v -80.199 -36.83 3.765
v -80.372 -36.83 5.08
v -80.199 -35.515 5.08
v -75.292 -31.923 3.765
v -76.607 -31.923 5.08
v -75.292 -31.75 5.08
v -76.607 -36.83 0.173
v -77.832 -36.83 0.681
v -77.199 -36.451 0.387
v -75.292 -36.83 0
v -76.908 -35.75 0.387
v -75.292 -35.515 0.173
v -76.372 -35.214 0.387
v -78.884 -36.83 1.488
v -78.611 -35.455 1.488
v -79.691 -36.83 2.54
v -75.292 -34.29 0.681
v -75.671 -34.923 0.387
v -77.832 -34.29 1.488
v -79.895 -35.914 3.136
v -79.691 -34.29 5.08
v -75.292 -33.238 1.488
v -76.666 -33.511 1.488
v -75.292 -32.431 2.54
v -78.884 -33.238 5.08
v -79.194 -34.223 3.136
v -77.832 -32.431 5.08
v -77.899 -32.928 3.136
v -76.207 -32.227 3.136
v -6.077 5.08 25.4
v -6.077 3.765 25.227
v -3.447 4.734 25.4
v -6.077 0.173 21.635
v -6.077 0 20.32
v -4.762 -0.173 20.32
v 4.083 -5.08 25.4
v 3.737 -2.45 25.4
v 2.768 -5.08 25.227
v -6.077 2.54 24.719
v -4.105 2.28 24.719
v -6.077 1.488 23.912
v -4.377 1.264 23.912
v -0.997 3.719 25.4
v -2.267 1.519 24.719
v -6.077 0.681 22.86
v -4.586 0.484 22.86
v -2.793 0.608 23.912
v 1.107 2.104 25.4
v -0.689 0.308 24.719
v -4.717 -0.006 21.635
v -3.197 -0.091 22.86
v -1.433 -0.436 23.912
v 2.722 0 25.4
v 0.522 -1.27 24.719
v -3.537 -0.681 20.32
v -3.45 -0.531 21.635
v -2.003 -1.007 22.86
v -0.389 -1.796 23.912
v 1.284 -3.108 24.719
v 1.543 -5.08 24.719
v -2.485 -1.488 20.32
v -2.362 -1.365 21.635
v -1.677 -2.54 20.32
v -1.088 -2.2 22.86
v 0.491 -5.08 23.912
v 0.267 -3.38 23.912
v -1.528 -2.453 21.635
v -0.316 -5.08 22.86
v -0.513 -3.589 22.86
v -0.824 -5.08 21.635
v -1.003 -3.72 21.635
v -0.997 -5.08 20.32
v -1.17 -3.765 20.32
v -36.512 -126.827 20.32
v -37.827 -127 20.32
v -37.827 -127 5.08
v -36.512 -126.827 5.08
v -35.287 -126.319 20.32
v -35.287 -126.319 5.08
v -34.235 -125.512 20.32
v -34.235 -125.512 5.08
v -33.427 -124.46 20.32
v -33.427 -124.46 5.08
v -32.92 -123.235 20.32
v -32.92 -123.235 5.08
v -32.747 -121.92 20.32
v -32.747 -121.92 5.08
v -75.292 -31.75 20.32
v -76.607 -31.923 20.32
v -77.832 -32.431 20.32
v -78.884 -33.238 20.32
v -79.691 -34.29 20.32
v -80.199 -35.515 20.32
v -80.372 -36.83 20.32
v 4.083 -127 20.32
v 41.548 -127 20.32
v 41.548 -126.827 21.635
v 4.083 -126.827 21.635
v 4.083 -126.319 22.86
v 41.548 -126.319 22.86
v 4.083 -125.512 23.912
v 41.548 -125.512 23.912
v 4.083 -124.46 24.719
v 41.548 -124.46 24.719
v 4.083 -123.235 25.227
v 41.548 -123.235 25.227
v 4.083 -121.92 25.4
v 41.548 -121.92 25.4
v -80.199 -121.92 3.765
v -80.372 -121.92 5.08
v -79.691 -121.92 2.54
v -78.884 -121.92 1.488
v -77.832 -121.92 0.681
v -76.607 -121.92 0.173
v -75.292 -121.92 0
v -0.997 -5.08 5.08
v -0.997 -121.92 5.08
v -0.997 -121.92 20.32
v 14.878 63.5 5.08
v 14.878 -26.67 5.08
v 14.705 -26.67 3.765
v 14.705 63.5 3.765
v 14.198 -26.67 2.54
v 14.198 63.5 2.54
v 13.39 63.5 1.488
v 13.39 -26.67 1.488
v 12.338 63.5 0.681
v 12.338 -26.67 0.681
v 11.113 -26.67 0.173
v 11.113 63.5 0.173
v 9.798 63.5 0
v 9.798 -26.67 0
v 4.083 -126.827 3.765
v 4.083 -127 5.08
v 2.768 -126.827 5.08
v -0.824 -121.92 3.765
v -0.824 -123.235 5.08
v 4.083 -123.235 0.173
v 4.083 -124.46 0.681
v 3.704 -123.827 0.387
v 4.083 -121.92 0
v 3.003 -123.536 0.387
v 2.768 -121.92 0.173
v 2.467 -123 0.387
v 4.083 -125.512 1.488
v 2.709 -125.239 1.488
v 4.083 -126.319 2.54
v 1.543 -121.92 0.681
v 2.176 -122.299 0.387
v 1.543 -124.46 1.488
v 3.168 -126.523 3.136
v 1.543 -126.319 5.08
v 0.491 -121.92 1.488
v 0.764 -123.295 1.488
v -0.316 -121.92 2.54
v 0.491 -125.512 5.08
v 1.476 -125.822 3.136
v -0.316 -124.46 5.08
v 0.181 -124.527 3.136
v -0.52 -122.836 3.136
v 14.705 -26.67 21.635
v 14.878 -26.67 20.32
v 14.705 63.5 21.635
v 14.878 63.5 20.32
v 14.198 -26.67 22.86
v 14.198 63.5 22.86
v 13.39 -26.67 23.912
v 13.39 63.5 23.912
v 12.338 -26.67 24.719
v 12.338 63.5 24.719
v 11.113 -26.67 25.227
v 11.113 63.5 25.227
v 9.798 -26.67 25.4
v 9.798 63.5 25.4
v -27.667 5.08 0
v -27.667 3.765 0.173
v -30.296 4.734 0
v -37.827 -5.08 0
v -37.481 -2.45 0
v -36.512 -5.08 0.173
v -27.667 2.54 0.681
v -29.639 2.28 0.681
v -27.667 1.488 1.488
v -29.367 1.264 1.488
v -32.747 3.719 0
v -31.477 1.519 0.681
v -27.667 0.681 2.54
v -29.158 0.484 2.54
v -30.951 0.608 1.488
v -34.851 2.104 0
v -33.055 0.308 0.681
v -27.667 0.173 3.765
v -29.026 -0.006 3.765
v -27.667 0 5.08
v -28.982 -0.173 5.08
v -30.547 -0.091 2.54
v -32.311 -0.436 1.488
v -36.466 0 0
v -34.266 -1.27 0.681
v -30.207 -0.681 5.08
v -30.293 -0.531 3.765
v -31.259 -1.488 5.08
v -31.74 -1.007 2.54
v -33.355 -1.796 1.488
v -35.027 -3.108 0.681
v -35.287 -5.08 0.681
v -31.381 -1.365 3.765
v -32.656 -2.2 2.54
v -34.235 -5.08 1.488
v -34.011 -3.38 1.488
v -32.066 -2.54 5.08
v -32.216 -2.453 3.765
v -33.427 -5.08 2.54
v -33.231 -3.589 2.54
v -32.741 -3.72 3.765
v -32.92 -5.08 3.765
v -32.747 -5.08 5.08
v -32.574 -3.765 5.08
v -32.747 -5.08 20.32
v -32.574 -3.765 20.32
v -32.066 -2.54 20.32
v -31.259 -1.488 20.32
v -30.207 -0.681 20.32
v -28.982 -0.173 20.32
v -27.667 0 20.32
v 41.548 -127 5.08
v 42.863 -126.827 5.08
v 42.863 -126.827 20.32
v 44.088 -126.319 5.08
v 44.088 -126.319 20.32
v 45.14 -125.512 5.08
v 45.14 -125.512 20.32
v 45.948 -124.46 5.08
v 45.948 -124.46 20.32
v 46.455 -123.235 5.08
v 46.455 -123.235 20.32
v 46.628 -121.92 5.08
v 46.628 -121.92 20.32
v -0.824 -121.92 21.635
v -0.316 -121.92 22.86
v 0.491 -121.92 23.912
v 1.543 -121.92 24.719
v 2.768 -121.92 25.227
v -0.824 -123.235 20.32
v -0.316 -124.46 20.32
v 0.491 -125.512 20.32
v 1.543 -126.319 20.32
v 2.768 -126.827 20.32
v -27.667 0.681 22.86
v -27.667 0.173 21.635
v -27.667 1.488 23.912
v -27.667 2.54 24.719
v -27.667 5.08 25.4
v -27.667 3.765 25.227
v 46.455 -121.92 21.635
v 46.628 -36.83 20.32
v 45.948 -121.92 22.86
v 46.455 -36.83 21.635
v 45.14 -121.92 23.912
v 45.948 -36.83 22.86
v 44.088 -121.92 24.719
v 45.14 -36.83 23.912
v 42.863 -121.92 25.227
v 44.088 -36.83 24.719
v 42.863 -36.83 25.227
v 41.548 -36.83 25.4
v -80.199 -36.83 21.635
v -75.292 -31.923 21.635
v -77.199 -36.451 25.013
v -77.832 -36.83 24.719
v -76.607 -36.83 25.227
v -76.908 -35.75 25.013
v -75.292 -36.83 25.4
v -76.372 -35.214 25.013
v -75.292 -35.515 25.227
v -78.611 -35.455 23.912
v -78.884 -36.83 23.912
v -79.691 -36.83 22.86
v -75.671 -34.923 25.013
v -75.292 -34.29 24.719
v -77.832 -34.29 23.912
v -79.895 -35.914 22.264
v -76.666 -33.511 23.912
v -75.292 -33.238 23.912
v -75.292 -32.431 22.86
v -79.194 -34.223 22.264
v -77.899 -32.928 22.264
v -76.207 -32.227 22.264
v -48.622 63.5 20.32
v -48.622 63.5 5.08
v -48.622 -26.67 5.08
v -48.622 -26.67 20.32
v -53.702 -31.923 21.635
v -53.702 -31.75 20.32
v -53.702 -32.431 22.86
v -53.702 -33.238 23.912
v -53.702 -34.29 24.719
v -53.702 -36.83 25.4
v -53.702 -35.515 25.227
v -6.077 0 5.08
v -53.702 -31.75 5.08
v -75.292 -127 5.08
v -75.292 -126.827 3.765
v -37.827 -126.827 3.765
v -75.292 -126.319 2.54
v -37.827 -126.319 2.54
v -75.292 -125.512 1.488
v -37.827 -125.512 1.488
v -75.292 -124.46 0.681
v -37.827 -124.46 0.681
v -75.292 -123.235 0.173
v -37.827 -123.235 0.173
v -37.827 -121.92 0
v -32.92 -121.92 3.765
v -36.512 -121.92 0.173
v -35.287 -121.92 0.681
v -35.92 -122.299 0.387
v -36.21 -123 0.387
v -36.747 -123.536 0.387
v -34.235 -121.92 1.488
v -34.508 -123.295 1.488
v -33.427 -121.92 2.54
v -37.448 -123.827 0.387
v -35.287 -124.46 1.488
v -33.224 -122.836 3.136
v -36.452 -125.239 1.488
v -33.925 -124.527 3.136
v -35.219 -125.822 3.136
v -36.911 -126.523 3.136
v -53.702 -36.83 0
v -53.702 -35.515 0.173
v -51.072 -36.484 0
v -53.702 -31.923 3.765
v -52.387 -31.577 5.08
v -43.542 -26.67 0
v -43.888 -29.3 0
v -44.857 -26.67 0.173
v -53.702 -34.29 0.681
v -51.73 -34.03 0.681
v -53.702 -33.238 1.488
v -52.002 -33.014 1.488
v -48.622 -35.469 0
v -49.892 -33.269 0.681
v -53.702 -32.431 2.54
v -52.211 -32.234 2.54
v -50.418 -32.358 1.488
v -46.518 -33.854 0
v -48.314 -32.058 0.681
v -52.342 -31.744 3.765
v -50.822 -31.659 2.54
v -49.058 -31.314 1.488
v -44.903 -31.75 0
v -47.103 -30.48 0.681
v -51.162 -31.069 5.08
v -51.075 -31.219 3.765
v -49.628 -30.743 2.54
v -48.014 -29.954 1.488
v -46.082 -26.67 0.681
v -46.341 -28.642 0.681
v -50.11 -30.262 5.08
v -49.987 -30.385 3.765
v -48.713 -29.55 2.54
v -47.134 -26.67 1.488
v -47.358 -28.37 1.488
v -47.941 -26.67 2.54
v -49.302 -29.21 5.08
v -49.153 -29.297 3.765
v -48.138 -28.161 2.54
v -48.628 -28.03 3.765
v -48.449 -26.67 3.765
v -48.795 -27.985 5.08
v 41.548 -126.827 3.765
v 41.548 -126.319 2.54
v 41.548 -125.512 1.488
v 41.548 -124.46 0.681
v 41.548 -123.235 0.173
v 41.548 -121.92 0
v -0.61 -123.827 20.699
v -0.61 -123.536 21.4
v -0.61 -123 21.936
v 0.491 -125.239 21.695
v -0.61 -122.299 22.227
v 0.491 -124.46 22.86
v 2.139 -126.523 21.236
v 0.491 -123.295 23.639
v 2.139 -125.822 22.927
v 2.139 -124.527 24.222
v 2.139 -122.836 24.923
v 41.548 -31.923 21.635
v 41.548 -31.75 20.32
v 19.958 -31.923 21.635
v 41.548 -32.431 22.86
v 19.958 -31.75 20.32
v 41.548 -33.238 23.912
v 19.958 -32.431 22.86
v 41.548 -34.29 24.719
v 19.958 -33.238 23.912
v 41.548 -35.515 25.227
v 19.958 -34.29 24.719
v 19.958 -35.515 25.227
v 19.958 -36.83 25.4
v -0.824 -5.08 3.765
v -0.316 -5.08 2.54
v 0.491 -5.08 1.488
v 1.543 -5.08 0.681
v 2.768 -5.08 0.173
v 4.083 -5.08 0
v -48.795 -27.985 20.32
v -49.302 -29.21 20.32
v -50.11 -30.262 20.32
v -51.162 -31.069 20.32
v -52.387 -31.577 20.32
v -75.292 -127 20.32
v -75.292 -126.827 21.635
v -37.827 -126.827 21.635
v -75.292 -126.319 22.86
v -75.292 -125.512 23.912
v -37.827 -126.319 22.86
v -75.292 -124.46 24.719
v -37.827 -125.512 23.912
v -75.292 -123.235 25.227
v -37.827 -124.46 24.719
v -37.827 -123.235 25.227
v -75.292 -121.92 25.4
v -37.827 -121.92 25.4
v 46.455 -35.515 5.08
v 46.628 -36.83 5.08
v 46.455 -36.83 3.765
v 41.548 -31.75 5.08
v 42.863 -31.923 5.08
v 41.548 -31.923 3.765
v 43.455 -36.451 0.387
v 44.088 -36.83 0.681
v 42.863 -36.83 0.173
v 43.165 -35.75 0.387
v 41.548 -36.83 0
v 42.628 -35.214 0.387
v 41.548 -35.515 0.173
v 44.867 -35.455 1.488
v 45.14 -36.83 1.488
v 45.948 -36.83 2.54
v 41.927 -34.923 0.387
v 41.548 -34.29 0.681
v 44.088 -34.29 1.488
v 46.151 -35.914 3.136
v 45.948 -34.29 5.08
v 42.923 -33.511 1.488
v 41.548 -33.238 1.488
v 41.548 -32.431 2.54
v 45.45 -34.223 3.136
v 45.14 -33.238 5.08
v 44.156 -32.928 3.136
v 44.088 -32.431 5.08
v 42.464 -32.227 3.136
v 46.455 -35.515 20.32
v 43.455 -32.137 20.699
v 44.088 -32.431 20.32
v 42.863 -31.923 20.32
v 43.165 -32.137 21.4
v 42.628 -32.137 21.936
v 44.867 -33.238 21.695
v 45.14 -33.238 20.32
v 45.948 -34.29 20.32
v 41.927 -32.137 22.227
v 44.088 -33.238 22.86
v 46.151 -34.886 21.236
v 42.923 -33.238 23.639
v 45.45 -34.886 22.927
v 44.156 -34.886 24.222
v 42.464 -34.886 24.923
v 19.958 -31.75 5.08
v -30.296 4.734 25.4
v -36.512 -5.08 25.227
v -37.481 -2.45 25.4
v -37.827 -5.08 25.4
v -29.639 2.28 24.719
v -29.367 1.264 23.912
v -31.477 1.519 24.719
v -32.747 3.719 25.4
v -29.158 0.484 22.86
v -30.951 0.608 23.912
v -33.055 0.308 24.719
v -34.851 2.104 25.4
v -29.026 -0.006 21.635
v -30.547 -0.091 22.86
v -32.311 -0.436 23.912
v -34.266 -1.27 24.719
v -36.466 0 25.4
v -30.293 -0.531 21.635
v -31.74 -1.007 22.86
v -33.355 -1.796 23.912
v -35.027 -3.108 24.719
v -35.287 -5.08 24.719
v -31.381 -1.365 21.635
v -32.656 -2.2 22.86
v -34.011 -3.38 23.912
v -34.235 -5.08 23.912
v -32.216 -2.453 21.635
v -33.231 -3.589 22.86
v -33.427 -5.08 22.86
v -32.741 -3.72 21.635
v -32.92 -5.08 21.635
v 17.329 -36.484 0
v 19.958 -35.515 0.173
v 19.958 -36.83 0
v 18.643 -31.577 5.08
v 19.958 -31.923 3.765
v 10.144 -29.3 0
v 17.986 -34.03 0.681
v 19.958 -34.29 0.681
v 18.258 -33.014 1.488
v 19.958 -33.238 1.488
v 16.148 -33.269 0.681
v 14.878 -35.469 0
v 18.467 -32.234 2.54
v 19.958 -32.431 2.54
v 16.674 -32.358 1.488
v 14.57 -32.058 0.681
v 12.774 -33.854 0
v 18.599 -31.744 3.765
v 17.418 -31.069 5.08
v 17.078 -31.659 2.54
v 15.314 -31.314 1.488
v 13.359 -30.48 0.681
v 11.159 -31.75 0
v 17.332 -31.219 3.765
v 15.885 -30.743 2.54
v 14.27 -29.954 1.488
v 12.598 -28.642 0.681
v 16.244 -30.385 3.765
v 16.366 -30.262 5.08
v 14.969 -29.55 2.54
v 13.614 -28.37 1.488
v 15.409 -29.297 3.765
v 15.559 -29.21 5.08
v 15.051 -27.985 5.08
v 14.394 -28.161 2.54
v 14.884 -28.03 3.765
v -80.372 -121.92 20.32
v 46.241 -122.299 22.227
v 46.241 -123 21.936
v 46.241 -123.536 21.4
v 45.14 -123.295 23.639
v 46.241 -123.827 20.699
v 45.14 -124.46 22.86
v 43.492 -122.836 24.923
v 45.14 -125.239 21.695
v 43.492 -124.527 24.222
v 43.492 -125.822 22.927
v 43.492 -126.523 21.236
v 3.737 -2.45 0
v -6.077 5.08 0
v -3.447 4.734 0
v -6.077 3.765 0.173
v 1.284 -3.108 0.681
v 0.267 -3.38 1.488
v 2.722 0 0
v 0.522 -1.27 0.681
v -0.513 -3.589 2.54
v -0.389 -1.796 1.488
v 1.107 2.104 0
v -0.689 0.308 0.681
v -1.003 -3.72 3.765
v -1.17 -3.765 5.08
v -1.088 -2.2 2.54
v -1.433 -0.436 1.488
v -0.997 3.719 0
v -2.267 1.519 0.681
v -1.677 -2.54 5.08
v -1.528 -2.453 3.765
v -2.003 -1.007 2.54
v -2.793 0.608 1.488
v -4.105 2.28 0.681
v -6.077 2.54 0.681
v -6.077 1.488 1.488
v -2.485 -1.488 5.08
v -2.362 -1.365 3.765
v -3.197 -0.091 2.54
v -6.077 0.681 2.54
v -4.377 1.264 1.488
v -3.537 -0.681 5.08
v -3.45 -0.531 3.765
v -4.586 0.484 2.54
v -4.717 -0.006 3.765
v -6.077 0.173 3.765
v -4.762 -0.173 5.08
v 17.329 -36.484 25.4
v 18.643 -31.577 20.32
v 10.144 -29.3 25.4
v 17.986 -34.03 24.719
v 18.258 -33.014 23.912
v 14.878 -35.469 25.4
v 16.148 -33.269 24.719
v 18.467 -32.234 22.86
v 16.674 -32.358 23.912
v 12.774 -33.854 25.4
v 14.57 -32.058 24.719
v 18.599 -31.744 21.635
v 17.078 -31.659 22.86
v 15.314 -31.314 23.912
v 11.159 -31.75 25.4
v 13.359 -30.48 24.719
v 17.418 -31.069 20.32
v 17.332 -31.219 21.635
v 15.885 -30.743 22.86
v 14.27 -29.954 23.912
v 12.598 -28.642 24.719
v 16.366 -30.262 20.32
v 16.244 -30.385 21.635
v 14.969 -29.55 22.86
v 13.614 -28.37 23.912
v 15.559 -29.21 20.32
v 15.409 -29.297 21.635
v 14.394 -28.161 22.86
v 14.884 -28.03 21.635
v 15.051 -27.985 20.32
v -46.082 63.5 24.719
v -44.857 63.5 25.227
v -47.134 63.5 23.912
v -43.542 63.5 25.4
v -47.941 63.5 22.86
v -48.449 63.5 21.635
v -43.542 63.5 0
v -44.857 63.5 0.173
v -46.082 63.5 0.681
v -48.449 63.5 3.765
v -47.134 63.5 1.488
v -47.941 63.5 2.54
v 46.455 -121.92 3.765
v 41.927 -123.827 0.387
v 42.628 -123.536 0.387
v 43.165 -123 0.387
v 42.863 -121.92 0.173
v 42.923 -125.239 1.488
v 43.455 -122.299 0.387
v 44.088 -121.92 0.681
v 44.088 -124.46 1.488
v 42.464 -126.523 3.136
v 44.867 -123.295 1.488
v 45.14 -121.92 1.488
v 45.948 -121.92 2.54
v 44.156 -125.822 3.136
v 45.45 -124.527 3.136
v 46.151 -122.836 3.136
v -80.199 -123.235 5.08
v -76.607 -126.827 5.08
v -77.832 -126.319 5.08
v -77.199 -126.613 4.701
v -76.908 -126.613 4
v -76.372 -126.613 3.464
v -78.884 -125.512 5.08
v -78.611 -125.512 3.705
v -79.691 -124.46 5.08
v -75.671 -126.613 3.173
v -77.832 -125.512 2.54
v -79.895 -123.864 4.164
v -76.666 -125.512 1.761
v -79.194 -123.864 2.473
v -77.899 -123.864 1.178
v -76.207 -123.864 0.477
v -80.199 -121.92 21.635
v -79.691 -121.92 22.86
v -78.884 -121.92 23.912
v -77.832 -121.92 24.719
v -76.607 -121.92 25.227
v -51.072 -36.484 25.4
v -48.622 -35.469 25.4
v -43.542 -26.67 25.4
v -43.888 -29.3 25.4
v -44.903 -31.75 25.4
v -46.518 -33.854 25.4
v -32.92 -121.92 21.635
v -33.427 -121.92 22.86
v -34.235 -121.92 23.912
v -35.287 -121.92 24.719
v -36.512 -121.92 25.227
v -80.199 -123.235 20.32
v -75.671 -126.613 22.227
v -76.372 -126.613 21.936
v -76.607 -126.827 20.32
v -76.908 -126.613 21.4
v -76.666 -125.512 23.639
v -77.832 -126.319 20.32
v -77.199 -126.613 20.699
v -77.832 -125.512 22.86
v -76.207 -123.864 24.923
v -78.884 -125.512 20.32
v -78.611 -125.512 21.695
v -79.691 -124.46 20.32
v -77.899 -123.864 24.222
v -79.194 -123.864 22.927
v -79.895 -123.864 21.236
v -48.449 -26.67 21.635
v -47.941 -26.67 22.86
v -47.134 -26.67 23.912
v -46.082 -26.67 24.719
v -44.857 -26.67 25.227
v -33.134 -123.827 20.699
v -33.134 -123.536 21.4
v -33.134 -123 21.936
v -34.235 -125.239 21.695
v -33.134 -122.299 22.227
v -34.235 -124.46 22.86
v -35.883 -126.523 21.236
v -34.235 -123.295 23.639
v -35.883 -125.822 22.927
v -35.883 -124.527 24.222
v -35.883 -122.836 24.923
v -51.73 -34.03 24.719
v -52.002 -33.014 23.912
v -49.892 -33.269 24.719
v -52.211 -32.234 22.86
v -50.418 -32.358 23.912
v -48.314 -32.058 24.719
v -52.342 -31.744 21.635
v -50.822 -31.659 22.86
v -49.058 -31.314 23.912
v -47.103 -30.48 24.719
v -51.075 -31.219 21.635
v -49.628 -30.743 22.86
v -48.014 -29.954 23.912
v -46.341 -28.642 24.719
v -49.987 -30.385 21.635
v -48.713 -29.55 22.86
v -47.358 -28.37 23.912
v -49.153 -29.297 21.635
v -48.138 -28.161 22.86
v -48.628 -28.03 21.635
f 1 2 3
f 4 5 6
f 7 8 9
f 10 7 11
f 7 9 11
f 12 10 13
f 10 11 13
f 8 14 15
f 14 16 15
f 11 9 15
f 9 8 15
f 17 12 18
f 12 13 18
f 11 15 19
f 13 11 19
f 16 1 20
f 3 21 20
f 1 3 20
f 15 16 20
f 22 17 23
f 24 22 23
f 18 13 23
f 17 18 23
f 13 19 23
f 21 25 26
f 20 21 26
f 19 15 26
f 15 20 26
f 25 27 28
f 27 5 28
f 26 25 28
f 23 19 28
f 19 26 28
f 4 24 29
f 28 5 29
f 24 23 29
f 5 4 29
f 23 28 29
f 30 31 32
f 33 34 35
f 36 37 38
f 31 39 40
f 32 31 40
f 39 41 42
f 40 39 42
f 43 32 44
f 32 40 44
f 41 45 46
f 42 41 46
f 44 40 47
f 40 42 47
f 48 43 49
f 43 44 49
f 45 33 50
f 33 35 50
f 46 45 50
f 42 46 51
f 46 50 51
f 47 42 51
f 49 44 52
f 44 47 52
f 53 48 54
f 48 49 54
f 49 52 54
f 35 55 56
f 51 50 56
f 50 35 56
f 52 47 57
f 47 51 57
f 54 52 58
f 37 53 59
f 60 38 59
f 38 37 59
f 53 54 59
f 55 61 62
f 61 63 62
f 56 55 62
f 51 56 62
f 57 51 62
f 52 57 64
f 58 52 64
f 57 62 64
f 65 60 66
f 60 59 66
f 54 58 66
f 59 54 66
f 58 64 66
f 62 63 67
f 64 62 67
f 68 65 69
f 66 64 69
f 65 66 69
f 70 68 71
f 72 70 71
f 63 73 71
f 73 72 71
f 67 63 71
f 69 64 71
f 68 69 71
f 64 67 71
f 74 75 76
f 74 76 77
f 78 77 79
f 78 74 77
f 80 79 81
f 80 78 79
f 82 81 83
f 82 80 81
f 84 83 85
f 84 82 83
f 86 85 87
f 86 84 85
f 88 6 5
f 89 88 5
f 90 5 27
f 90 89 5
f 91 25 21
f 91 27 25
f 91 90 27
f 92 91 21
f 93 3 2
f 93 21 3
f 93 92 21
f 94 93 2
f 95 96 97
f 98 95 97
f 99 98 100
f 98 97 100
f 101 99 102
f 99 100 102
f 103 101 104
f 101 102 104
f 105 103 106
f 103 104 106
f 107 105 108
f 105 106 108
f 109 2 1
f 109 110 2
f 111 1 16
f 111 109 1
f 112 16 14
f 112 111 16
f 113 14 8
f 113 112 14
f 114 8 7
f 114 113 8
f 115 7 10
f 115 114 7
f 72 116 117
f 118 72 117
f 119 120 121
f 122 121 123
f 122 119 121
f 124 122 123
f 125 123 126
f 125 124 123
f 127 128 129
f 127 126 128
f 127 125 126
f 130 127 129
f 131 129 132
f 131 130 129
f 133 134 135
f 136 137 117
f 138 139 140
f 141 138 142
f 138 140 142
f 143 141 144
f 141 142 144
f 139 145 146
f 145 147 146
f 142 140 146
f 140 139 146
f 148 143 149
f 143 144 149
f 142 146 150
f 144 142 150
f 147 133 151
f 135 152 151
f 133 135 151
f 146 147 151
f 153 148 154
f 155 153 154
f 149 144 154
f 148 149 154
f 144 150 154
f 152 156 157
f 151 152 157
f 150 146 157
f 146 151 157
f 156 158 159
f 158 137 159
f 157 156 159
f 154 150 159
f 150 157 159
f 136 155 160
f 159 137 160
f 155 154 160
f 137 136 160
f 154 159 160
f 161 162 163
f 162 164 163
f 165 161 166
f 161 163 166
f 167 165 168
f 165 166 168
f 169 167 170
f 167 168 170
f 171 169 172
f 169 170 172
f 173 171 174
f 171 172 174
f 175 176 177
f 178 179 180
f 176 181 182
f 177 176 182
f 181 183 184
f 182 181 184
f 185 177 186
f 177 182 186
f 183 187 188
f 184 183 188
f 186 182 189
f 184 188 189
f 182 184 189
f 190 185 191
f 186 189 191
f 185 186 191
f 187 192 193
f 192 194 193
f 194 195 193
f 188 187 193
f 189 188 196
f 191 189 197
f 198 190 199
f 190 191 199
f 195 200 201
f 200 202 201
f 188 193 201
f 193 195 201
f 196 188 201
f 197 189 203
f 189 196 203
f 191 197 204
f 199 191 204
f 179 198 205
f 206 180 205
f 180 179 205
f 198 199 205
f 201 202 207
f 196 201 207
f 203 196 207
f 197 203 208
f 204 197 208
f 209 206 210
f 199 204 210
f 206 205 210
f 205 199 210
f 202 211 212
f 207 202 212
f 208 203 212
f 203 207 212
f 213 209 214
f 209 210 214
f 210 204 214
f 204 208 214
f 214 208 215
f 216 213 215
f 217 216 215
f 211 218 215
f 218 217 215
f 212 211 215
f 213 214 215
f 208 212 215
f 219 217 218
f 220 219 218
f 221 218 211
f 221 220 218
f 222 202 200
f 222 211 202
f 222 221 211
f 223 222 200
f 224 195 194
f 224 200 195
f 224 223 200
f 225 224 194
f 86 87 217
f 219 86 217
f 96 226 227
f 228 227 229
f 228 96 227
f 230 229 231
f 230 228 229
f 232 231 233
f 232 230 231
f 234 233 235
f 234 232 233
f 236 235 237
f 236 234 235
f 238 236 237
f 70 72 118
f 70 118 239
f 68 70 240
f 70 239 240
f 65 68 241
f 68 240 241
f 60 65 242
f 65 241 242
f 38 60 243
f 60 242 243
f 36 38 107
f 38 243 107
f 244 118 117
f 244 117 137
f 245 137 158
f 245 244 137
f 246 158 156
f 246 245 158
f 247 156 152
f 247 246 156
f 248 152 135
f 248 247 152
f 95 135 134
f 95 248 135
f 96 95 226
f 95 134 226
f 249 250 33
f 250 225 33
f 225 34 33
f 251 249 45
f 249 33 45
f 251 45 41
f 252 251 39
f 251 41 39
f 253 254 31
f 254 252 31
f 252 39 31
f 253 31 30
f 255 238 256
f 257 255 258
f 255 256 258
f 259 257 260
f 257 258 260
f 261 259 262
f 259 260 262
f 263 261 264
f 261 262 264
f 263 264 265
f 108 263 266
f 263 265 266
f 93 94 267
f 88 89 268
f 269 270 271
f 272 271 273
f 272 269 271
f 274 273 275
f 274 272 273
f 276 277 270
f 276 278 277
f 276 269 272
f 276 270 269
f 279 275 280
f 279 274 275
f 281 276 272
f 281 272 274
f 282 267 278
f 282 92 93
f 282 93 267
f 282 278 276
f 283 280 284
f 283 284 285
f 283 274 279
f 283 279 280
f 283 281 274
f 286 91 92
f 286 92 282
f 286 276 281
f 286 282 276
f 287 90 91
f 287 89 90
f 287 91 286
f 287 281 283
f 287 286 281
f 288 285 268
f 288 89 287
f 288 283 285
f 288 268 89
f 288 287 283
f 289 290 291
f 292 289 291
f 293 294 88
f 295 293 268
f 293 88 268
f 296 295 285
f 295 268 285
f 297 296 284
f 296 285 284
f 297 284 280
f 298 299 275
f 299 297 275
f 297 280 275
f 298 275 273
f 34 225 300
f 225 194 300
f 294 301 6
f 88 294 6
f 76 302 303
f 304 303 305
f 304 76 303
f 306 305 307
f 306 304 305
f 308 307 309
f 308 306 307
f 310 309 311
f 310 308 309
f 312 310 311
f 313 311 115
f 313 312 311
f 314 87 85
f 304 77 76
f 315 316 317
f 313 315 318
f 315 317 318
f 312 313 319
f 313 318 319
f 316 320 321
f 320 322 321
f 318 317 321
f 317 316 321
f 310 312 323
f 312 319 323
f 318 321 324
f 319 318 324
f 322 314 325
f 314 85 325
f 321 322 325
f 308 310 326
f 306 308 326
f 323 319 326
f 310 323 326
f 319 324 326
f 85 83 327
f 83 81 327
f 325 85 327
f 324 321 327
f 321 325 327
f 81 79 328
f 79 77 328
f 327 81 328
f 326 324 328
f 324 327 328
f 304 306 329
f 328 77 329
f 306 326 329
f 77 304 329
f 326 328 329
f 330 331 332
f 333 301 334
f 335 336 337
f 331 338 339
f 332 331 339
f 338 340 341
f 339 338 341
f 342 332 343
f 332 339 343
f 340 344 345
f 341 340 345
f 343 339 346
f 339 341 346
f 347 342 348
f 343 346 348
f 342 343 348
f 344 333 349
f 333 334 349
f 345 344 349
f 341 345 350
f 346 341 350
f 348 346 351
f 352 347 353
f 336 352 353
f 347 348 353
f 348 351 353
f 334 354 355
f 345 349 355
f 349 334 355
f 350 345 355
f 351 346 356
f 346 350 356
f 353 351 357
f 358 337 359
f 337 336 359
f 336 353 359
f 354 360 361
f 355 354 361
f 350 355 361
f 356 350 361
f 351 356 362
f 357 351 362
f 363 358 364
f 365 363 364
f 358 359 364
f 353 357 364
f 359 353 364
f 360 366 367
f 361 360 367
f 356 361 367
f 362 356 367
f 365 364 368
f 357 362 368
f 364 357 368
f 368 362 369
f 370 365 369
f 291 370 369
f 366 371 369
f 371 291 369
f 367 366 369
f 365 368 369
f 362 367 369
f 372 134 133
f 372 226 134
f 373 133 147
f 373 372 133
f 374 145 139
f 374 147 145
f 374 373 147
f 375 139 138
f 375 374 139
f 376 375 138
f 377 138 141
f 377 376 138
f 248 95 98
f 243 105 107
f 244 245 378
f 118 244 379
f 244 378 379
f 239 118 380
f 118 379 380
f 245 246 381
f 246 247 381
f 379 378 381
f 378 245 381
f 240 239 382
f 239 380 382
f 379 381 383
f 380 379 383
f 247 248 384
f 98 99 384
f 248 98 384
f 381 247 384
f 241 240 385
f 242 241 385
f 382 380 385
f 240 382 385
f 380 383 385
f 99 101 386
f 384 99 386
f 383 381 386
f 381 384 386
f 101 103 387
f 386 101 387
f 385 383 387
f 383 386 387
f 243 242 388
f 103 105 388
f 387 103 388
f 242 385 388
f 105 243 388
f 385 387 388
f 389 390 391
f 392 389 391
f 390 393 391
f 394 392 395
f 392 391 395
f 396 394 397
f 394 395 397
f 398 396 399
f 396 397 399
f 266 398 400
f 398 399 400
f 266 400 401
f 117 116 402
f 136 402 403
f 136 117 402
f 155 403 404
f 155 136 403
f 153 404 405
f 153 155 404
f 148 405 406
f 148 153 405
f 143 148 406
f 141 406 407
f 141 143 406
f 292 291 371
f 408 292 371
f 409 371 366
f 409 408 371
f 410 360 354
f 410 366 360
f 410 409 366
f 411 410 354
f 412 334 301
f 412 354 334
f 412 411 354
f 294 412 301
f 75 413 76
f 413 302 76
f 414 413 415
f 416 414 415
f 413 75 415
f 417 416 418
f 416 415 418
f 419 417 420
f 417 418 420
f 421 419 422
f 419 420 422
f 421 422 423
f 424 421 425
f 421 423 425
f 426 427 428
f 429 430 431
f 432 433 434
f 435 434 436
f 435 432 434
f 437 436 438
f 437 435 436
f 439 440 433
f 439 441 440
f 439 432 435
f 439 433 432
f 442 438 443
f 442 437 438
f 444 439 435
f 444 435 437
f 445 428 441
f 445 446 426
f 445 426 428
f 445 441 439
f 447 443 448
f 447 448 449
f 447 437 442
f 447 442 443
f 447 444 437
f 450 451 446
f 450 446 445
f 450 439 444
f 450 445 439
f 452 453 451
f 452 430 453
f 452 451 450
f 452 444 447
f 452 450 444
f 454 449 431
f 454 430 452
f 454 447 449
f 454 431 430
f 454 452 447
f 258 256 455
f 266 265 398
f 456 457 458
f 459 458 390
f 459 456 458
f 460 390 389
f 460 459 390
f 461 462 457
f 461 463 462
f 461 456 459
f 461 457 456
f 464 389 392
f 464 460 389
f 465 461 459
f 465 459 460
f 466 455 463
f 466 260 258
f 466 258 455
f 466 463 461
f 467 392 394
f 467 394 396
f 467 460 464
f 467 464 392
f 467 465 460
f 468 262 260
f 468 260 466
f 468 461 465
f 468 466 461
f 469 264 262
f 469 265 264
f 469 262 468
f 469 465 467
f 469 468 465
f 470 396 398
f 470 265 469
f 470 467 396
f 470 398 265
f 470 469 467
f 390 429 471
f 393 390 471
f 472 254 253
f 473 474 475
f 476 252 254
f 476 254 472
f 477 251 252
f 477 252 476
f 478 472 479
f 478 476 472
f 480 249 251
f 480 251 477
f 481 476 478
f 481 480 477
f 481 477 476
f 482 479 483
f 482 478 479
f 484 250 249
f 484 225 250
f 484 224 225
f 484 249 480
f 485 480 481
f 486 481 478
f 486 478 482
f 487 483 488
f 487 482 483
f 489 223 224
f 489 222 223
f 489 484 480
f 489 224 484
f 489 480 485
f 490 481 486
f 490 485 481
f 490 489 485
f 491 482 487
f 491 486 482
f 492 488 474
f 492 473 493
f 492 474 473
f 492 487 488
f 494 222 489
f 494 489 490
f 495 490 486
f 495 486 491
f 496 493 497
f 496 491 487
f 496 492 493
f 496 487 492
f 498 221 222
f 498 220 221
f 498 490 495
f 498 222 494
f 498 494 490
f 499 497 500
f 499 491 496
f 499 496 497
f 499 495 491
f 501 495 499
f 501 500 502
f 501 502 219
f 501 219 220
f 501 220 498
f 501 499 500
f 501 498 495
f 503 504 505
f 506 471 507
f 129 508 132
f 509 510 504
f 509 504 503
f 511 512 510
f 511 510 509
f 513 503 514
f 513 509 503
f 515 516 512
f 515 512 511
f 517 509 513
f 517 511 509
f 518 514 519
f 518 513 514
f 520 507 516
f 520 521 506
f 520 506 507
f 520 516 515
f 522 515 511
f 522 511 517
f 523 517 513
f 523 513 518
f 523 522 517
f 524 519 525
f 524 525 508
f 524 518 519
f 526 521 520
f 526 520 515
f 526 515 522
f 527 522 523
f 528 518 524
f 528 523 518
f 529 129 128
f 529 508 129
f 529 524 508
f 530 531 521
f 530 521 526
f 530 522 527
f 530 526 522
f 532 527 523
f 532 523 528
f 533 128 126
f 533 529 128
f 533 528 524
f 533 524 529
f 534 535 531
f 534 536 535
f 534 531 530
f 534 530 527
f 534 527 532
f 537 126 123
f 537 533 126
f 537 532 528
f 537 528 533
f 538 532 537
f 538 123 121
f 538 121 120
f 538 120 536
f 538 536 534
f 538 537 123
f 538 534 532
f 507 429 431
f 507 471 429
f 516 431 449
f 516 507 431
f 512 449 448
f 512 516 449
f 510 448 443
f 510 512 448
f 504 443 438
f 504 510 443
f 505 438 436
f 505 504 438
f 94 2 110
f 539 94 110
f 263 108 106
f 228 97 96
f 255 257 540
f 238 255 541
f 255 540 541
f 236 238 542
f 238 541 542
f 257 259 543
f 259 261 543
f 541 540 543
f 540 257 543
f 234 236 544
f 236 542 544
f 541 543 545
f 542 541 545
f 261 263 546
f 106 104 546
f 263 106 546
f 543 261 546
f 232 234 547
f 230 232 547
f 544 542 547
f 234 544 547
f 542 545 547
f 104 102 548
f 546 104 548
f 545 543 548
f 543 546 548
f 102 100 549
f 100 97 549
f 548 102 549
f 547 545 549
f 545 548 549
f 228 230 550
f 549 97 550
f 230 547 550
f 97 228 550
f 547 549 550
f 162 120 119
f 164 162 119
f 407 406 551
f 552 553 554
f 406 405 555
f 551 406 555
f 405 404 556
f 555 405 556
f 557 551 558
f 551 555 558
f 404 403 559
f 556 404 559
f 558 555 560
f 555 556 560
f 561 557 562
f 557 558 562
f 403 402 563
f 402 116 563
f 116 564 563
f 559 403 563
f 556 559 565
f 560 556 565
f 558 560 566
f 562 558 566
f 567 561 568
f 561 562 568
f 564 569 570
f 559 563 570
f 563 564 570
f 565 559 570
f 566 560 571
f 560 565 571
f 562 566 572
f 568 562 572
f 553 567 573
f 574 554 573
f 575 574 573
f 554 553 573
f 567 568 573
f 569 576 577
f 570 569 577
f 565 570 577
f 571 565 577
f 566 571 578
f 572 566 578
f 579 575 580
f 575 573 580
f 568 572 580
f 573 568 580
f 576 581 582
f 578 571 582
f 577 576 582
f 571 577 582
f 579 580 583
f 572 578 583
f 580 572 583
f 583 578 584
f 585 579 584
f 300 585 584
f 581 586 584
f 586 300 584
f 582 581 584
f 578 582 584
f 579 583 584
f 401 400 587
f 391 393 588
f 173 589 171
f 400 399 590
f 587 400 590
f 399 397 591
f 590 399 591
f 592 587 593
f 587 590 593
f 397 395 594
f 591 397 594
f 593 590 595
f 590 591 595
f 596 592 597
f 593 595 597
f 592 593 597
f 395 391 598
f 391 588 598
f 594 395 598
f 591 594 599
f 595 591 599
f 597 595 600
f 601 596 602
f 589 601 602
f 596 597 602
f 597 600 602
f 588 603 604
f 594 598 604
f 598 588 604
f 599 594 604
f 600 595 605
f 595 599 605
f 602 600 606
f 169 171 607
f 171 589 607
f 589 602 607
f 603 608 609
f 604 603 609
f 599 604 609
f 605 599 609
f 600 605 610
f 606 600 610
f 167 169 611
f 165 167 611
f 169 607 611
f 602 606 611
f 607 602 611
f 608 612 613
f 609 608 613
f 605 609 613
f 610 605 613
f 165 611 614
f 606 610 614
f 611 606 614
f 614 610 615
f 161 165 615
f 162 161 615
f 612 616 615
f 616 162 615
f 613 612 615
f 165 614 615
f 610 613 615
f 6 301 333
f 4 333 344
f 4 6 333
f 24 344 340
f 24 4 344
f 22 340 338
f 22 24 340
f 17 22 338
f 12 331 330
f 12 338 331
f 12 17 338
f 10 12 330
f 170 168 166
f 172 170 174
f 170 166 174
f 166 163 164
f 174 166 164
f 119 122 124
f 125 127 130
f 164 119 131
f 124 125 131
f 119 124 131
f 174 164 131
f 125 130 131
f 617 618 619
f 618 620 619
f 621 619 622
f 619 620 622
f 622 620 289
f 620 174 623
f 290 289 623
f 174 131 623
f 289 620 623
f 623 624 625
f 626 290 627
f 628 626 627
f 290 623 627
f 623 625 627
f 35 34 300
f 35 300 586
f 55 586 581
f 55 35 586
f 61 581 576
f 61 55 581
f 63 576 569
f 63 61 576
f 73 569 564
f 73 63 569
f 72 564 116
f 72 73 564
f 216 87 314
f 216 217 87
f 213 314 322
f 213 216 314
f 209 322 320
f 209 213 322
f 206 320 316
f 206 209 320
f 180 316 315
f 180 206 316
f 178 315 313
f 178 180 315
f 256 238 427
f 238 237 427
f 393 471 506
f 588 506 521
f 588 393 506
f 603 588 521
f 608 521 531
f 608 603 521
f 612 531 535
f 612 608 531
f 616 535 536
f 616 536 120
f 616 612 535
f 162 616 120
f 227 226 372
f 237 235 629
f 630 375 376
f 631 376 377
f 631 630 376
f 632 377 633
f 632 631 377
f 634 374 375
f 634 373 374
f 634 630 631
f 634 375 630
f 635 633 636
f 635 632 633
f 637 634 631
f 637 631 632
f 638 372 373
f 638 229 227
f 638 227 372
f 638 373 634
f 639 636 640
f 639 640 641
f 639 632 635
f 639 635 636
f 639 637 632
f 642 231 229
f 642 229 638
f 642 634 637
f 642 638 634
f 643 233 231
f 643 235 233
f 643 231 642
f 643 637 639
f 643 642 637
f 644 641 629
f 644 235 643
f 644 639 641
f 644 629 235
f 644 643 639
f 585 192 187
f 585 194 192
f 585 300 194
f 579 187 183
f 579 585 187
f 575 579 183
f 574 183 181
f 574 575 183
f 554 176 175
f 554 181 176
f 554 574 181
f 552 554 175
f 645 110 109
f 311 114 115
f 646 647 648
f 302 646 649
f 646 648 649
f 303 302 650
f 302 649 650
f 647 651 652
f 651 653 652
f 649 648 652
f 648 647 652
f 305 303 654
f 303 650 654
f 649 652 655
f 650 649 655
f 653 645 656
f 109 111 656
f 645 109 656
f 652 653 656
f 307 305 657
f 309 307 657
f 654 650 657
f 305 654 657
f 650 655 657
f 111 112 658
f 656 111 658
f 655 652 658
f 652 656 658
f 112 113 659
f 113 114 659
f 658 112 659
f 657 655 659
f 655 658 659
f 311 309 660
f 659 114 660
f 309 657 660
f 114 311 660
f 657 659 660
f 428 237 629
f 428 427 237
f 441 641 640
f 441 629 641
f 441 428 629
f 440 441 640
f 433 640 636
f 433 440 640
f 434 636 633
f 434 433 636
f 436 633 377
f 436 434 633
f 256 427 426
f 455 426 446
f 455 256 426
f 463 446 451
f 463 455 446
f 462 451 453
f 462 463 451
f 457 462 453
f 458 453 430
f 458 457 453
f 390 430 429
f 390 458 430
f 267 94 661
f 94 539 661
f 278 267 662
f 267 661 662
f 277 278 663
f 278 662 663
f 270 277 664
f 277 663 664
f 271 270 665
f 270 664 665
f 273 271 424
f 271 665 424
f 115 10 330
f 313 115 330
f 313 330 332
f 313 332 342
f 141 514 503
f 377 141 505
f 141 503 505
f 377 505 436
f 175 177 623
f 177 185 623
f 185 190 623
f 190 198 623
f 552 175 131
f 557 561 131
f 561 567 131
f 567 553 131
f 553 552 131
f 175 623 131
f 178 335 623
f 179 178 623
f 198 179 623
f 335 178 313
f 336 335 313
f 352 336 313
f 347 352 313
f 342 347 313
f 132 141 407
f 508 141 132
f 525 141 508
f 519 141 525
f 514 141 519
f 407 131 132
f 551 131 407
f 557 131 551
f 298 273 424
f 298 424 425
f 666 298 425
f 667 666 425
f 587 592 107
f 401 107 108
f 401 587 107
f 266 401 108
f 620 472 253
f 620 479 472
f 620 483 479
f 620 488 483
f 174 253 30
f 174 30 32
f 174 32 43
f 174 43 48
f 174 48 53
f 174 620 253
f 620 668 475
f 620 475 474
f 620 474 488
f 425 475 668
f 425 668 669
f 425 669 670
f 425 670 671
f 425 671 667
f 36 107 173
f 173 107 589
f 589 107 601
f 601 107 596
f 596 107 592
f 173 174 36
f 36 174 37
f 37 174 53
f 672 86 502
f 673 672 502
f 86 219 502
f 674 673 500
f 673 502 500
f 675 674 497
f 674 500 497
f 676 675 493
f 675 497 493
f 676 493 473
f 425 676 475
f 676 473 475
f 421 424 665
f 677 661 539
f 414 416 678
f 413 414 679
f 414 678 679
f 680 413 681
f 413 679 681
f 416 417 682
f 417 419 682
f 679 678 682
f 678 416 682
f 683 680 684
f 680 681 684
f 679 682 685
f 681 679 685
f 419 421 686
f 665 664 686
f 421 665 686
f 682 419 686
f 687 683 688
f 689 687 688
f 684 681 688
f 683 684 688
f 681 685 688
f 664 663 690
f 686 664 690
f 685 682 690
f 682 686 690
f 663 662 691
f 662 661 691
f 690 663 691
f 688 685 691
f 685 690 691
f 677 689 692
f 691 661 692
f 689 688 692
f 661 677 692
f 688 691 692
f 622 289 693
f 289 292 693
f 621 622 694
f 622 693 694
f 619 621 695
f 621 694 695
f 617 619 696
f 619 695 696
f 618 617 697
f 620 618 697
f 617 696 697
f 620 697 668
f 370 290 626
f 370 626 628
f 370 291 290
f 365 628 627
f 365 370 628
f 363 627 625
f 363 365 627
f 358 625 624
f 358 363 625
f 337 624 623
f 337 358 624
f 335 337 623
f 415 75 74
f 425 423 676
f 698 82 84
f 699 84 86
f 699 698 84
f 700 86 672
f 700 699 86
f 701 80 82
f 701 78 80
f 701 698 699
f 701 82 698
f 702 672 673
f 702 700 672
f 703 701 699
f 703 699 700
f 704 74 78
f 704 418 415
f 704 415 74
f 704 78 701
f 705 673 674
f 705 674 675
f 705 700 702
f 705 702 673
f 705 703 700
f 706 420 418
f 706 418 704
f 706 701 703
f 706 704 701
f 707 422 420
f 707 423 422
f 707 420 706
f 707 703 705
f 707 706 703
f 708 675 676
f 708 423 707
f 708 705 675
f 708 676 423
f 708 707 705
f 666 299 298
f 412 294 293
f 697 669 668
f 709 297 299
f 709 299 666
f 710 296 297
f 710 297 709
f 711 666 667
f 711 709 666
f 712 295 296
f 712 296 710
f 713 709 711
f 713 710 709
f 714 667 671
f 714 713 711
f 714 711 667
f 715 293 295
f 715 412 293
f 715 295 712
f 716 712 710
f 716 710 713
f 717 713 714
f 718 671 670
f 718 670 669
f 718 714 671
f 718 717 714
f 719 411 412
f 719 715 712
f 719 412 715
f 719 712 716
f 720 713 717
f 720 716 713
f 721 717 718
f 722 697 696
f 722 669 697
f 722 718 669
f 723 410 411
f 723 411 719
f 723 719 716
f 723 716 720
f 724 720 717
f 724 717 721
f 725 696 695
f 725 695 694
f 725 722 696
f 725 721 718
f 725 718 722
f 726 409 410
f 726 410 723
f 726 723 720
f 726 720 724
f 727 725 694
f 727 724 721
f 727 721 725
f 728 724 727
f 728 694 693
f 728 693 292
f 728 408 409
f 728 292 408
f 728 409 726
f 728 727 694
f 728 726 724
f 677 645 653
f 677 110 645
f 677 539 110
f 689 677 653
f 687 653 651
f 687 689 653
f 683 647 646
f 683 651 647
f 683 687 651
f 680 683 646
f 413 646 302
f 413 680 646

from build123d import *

# Parameters (mm, degrees)
F1_DEPTH = 25.4
F2_R     = 5.08


with BuildPart() as f1:
    # F0 (on Top) → F1 (new body)
    with BuildSketch(Plane.XY):
        Polygon((14.8781485382, 63.5), (-48.6218514618, 63.5), (-48.6218514618, -31.75), (-80.3718514618, -31.75), (-80.3718514618, -127), (-32.7468514618, -127), (-32.7468514618, 0), (-0.9968514618, 0), (-0.9968514618, -127), (46.6281485382, -127), (46.6281485382, -31.75), (14.8781485382, -31.75), align=None)
    extrude(amount=F1_DEPTH)

    # F2
    f2_edges = [f1.edges().sort_by_distance(p)[0] for p in [
        (14.878149, 15.875, 25.4),
        (-48.621851, 15.875, 25.4),
        (-48.621851, 15.875, 0),
        (14.878149, 15.875, 0),
        (14.878149, -31.75, 12.7),
        (-48.621851, -31.75, 12.7),
        (-80.371851, -31.75, 12.7),
        (-80.371851, -79.375, 25.4),
        (-80.371851, -79.375, 0),
        (-56.559351, -127, 25.4),
        (-80.371851, -127, 12.7),
        (22.815649, -127, 25.4),
        (46.628149, -79.375, 25.4),
        (-0.996851, -127, 12.7),
        (46.628149, -127, 12.7),
        (22.815649, -127, 0),
        (-32.746851, -127, 12.7),
        (-16.871851, 0, 25.4),
        (-32.746851, -63.5, 25.4),
        (-0.996851, -63.5, 25.4),
        (46.628149, -31.75, 12.7),
        (-0.996851, -63.5, 0),
        (-16.871851, 0, 0),
        (46.628149, -79.375, 0),
        (-32.746851, -63.5, 0),
        (-0.996851, 0, 12.7),
        (-32.746851, 0, 12.7),
        (-56.559351, -127, 0),
        (-64.496851, -31.75, 0),
        (-64.496851, -31.75, 25.4),
        (30.753149, -31.75, 0),
        (30.753149, -31.75, 25.4),
    ]]
    fillet(f2_edges, radius=F2_R)


solid = f1.part
